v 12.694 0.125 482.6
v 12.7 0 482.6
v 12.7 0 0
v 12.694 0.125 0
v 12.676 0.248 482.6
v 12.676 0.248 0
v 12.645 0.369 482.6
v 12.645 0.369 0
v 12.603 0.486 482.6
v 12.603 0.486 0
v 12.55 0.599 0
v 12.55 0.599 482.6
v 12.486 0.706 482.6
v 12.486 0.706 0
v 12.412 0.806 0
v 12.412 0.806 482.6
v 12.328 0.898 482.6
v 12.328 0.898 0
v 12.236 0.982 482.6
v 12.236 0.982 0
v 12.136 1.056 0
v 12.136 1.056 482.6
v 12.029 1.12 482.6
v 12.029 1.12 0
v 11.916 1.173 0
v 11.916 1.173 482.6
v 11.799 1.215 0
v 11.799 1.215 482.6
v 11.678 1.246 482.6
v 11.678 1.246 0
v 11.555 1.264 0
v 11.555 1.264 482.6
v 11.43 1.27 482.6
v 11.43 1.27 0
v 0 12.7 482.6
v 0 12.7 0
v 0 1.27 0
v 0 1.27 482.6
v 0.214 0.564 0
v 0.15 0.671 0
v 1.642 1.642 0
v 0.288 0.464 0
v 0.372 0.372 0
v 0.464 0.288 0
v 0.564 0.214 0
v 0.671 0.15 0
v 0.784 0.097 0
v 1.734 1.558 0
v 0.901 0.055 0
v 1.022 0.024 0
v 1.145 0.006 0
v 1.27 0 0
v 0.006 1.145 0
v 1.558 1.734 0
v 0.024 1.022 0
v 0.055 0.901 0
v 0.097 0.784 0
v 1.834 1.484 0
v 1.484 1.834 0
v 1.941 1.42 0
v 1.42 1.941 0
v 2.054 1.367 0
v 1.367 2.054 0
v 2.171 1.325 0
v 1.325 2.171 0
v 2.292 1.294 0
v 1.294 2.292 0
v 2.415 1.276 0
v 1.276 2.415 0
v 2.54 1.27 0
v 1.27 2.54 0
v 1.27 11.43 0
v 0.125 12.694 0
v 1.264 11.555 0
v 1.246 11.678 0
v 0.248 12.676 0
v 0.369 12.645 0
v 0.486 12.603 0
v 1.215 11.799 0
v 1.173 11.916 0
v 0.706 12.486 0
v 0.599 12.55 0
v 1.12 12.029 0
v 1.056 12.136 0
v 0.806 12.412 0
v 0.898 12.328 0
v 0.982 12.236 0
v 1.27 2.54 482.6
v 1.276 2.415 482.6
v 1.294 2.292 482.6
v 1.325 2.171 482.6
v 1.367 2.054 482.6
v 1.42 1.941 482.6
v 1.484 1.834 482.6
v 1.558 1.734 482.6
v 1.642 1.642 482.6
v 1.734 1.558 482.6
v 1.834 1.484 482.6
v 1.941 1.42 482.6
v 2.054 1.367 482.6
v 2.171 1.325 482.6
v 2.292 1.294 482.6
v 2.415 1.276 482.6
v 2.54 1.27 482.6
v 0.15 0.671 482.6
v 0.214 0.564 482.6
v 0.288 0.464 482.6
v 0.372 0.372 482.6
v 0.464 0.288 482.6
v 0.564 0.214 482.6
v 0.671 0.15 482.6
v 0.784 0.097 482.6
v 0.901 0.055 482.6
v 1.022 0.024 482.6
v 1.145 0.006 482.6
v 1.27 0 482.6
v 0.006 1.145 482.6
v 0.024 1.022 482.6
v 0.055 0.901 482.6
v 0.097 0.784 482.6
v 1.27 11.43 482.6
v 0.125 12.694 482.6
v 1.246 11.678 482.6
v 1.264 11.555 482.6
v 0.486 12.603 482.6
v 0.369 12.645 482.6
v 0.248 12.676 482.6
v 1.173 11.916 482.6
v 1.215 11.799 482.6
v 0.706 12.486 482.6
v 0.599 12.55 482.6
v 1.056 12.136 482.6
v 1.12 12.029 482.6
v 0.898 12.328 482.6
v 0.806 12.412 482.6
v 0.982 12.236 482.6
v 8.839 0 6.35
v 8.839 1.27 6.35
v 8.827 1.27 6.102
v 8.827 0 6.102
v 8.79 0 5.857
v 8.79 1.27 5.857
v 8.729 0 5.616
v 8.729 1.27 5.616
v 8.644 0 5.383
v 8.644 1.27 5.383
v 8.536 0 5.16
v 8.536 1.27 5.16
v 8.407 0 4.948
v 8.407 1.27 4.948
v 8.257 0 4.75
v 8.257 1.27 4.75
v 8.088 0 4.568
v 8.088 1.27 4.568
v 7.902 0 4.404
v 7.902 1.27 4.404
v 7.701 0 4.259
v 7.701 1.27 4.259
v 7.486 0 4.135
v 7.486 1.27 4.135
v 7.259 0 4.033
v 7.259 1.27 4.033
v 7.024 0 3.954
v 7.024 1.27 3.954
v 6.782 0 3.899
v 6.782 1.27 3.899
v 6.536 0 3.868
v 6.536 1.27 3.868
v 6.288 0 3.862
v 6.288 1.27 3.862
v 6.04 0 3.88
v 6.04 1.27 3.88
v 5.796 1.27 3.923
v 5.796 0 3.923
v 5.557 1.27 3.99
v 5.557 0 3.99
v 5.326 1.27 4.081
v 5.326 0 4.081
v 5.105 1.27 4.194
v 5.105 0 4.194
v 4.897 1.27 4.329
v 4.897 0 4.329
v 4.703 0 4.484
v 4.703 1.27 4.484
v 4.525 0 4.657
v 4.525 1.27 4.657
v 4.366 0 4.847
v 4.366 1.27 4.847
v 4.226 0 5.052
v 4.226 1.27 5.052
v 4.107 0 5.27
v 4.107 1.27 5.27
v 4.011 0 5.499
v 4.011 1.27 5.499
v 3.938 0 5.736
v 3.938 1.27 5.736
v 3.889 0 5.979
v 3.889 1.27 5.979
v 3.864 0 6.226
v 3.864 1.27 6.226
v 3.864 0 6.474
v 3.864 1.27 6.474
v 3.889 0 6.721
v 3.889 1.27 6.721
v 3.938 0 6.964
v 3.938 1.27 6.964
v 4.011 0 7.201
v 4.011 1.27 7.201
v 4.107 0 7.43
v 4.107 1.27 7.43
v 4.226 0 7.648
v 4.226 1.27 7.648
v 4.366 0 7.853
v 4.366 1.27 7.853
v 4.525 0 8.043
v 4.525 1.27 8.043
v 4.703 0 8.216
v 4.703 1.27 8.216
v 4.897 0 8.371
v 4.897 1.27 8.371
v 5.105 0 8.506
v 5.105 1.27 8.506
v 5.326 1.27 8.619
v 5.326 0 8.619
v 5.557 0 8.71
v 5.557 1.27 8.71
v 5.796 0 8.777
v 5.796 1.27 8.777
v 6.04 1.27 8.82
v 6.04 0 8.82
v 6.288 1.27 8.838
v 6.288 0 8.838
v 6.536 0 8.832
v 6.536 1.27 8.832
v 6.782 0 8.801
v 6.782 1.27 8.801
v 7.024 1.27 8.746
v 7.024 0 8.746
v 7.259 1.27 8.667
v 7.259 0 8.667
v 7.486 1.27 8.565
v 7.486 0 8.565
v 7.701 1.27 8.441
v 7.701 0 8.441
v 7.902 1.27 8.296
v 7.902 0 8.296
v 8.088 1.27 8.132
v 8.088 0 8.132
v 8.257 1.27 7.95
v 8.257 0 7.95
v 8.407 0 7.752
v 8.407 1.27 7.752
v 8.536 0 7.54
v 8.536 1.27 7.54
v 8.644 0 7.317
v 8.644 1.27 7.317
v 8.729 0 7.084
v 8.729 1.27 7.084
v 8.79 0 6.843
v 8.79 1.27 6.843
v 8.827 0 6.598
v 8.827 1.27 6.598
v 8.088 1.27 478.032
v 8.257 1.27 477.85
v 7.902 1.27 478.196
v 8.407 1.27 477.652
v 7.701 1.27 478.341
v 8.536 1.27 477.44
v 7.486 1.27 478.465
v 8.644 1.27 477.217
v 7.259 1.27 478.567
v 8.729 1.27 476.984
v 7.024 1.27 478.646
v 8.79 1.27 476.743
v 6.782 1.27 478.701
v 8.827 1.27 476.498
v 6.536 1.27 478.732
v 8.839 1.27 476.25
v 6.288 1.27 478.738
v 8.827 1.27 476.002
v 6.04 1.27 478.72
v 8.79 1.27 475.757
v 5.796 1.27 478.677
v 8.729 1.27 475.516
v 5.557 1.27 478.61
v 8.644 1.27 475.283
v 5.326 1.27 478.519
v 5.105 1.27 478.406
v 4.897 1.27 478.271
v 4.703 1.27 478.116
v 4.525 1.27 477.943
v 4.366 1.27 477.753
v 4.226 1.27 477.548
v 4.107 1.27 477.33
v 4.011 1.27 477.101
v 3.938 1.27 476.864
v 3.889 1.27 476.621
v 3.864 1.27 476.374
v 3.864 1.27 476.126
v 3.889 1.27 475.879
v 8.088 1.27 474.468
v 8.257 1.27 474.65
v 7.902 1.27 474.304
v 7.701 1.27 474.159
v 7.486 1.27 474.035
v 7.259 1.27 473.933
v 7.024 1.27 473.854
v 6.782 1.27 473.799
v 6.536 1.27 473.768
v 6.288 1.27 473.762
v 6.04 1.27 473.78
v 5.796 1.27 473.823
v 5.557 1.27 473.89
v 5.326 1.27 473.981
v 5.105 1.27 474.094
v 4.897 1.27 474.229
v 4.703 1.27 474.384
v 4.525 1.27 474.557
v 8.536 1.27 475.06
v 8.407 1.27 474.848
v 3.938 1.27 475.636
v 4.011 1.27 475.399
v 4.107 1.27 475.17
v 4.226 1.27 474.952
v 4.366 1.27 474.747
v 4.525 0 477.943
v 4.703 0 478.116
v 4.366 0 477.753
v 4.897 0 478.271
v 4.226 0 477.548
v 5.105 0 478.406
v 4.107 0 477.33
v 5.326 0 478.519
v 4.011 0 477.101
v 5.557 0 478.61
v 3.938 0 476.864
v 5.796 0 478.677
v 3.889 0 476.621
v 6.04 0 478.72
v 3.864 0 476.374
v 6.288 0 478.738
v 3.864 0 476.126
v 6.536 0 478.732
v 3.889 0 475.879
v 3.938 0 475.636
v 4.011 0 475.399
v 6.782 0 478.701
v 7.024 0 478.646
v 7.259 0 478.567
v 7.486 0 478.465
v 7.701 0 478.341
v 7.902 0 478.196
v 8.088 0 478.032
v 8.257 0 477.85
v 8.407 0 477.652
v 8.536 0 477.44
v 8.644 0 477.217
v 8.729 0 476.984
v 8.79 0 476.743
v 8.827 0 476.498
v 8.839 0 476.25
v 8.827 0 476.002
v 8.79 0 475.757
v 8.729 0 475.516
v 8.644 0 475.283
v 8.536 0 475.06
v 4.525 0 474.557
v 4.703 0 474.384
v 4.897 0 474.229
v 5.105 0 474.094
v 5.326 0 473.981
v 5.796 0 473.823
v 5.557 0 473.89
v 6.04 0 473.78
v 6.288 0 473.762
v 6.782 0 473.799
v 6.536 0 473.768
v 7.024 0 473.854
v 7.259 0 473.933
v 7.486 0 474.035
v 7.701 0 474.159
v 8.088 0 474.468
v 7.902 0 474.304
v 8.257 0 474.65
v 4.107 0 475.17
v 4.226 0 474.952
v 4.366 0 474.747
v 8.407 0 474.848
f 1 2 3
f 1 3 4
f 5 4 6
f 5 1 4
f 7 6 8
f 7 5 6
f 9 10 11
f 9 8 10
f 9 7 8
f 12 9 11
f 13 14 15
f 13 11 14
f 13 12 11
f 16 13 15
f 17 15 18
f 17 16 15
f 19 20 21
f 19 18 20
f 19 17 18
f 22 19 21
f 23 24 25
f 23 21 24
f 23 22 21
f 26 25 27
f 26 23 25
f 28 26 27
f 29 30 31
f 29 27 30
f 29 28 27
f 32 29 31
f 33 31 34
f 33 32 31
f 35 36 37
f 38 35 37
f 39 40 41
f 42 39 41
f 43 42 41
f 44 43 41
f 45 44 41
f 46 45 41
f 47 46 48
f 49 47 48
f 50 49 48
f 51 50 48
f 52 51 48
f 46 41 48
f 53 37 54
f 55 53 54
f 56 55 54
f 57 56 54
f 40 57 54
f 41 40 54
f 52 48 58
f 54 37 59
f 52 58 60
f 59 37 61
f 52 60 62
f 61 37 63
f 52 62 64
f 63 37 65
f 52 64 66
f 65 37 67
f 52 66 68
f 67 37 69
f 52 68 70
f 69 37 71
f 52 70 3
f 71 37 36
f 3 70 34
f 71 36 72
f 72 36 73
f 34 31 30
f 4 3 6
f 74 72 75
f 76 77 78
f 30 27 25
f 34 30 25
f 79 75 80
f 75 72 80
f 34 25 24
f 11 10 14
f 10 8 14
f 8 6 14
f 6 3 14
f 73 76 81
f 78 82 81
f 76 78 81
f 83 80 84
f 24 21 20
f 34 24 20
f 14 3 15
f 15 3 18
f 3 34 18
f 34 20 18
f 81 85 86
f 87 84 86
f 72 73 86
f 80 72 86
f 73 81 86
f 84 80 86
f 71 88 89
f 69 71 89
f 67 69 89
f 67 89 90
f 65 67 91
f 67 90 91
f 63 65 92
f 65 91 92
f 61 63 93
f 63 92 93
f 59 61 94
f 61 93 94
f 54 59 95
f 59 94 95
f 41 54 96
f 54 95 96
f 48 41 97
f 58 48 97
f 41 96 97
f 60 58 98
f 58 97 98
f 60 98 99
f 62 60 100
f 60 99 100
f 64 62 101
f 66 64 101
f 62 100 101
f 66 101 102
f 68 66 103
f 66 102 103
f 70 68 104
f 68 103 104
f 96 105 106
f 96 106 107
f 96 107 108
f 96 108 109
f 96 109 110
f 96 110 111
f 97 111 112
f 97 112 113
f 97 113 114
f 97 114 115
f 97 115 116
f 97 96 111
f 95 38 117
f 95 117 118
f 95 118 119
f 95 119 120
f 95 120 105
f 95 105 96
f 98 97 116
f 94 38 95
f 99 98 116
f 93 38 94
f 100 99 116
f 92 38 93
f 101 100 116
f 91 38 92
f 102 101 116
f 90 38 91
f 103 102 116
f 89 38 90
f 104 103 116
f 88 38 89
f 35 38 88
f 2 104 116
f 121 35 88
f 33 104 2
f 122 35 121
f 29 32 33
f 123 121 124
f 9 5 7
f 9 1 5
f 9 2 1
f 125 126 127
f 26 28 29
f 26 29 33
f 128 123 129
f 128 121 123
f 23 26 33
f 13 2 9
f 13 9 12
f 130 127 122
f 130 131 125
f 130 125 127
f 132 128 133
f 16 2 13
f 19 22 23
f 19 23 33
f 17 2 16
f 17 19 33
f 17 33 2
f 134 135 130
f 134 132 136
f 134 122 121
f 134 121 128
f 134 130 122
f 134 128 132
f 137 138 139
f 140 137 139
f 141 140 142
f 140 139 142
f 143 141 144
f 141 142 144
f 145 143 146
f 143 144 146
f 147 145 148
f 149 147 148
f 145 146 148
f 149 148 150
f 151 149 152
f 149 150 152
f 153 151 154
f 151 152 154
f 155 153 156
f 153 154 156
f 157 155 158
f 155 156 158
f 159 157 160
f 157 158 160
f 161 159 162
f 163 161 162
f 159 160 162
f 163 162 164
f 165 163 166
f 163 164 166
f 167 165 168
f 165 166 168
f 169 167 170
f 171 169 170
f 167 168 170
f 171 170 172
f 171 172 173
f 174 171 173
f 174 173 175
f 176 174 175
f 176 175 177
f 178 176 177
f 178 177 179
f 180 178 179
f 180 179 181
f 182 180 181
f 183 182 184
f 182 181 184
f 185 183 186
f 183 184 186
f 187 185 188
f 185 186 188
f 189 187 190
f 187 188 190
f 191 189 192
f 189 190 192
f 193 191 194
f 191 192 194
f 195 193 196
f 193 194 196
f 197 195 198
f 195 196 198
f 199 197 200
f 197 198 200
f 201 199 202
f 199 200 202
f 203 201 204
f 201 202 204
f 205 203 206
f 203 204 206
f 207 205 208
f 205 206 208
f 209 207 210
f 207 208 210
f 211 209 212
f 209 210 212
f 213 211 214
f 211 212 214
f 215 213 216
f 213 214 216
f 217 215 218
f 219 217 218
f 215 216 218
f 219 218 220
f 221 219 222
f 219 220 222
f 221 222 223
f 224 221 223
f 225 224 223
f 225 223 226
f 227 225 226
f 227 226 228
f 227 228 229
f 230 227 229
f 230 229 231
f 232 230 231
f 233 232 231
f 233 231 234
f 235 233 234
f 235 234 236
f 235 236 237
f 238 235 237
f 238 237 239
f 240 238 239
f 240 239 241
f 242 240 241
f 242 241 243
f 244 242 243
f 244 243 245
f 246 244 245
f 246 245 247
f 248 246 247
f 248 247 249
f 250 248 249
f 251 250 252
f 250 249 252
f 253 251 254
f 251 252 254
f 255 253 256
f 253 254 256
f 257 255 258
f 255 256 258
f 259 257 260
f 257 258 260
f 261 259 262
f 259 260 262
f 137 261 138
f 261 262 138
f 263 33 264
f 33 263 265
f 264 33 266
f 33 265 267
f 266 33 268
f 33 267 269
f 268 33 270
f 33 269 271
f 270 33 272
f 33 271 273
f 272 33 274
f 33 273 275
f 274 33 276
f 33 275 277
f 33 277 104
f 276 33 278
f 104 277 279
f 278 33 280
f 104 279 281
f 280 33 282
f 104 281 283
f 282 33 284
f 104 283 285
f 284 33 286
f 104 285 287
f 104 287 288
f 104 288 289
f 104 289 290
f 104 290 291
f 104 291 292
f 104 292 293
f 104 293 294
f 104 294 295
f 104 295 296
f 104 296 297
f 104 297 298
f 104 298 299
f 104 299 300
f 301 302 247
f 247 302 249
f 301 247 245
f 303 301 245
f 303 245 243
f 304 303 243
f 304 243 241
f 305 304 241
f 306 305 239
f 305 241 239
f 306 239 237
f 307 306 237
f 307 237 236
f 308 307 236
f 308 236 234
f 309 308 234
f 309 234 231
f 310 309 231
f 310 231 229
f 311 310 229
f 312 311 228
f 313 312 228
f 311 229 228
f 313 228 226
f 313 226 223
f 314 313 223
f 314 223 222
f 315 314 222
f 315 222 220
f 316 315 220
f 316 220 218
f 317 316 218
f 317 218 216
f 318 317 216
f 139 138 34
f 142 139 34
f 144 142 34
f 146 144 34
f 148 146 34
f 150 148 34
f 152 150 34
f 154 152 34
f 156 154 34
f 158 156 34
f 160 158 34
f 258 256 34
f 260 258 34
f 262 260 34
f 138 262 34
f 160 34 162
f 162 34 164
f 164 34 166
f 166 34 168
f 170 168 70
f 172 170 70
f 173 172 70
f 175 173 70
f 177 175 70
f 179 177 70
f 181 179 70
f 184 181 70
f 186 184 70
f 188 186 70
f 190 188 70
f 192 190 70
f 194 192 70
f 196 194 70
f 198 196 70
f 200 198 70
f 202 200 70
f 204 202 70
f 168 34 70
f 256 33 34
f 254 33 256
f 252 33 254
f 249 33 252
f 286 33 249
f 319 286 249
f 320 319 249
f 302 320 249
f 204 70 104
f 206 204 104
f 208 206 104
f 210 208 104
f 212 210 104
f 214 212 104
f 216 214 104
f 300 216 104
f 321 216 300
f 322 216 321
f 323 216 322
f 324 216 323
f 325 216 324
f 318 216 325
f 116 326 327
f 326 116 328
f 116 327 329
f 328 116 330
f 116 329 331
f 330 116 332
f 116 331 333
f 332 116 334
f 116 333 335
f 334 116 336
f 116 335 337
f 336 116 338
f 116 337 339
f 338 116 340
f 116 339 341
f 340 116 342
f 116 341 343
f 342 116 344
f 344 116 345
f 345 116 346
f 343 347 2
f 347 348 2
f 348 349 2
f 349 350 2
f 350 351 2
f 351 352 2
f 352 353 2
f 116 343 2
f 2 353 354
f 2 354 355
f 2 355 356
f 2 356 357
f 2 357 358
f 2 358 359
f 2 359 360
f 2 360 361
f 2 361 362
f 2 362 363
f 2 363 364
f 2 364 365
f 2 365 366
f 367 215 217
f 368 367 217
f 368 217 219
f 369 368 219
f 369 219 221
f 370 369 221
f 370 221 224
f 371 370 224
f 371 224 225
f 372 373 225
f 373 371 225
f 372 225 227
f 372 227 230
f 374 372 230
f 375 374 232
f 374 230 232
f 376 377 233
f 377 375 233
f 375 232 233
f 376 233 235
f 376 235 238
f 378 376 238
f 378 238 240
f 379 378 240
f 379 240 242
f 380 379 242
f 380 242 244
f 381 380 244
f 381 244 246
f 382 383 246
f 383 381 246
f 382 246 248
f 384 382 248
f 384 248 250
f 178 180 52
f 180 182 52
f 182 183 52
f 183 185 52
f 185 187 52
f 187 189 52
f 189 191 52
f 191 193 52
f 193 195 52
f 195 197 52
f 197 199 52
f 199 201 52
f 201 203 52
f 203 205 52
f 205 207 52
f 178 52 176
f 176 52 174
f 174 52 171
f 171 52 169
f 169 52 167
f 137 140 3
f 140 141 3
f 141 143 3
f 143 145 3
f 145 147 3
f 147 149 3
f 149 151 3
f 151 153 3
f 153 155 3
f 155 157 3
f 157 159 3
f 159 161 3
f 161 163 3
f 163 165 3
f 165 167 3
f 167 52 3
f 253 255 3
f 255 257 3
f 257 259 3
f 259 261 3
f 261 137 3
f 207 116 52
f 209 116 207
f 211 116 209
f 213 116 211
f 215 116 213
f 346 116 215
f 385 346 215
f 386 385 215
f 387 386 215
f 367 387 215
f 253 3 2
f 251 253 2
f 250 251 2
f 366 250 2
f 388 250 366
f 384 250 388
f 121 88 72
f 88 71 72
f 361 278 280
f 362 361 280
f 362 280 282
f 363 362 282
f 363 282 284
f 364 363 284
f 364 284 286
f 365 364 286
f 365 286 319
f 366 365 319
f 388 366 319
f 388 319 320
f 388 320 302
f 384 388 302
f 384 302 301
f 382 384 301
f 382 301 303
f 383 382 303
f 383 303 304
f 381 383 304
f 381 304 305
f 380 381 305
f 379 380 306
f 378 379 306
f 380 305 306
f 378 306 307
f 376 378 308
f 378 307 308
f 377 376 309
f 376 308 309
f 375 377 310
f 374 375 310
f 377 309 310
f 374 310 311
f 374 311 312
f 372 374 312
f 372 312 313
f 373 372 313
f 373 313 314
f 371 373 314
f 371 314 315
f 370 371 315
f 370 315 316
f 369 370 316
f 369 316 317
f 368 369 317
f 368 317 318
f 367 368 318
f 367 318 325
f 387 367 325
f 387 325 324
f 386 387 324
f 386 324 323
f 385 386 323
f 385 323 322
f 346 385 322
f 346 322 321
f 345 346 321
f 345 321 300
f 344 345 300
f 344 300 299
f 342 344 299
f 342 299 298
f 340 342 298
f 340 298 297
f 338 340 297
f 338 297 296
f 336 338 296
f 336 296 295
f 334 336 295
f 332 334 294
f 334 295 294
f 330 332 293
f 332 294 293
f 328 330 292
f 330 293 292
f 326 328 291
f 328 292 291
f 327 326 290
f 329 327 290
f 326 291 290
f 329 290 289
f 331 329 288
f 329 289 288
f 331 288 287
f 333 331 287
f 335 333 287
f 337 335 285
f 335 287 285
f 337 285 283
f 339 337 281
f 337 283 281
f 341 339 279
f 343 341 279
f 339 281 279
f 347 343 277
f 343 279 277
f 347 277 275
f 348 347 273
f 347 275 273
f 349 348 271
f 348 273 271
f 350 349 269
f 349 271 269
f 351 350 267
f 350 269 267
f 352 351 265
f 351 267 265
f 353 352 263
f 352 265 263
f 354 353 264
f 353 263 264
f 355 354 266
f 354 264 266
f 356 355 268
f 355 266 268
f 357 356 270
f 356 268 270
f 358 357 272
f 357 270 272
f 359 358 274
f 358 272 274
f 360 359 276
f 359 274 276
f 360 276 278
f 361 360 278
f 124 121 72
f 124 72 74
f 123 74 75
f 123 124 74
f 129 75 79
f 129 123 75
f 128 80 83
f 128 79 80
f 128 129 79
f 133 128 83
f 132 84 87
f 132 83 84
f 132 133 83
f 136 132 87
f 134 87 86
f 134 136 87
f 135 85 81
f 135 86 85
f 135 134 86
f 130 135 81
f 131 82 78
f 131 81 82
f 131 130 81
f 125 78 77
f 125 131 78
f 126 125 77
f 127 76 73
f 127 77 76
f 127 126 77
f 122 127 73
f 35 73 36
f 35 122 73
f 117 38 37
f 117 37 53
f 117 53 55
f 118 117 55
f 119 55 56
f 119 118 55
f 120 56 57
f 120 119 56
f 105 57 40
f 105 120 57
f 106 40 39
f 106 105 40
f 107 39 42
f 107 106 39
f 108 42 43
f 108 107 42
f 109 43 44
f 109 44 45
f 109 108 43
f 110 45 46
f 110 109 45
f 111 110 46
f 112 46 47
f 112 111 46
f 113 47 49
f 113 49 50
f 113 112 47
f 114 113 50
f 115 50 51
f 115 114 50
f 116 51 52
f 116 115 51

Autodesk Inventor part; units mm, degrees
ref_plane "YZ Plane" through (0, 0, 0) normal (1, 0, 0) x (0, 1, 0)
ref_plane "XZ Plane" through (0, 0, 0) normal (0, 1, 0) x (-1, 0, 0)
ref_plane "XY Plane" through (0, 0, 0) normal (0, 0, 1) x (1, 0, 0)
sketch "Sketch1" plane through (0, 0, 0) normal (0, 0, 1) x (1, 0, 0)
  line L0 (0, 0) -> (12.7, 0)
  line L1 (12.7, 0) -> (12.7, 1.27)
  line L2 (12.7, 1.27) -> (1.27, 1.27)
  line L3 (1.27, 1.27) -> (1.27, 12.7)
  line L4 (1.27, 12.7) -> (0, 12.7)
  line L5 (0, 12.7) -> (0, 0)
  dimension "d0" = 12.7
  dimension "d1" = 1.27
extrude "Extrusion1" add sketch "Sketch1" along normal blind 482.6
fillet "Fillet1" radius 1.27 4 edges at (12.7, 1.27, 241.3) (1.27, 1.27, 241.3) (1.27, 12.7, 241.3) (0, 0, 241.3)
sketch "Sketch2" plane through (2.54, 1.27, 482.6) normal (0, 1, 0) x (1, 0, 0)
  line L0 (0, 0) -> (0, 482.6) projected
  line L1 (8.89, 482.6) -> (8.89, 0) projected
  line L2 (8.89, 482.6) -> (0, 482.6) projected
  circle A0 centre (3.81, 476.25) radius 2.4892
  line L3 (-2.54, 482.6) -> (-2.54, 0) projected
  line L4 (8.89, 241.3) -> (0, 241.3) construction
  circle A1 centre (3.81, 6.35) radius 2.4892
  dimension "d6" = 4.9784
  dimension "d7" = 6.35
  dimension "d8" = 6.35
extrude "Extrusion2" cut sketch "Sketch2" against normal blind 25.4
equation "\"d8\" = d7"
properties part number ".05 in Aluminum Angle (19 in)"
